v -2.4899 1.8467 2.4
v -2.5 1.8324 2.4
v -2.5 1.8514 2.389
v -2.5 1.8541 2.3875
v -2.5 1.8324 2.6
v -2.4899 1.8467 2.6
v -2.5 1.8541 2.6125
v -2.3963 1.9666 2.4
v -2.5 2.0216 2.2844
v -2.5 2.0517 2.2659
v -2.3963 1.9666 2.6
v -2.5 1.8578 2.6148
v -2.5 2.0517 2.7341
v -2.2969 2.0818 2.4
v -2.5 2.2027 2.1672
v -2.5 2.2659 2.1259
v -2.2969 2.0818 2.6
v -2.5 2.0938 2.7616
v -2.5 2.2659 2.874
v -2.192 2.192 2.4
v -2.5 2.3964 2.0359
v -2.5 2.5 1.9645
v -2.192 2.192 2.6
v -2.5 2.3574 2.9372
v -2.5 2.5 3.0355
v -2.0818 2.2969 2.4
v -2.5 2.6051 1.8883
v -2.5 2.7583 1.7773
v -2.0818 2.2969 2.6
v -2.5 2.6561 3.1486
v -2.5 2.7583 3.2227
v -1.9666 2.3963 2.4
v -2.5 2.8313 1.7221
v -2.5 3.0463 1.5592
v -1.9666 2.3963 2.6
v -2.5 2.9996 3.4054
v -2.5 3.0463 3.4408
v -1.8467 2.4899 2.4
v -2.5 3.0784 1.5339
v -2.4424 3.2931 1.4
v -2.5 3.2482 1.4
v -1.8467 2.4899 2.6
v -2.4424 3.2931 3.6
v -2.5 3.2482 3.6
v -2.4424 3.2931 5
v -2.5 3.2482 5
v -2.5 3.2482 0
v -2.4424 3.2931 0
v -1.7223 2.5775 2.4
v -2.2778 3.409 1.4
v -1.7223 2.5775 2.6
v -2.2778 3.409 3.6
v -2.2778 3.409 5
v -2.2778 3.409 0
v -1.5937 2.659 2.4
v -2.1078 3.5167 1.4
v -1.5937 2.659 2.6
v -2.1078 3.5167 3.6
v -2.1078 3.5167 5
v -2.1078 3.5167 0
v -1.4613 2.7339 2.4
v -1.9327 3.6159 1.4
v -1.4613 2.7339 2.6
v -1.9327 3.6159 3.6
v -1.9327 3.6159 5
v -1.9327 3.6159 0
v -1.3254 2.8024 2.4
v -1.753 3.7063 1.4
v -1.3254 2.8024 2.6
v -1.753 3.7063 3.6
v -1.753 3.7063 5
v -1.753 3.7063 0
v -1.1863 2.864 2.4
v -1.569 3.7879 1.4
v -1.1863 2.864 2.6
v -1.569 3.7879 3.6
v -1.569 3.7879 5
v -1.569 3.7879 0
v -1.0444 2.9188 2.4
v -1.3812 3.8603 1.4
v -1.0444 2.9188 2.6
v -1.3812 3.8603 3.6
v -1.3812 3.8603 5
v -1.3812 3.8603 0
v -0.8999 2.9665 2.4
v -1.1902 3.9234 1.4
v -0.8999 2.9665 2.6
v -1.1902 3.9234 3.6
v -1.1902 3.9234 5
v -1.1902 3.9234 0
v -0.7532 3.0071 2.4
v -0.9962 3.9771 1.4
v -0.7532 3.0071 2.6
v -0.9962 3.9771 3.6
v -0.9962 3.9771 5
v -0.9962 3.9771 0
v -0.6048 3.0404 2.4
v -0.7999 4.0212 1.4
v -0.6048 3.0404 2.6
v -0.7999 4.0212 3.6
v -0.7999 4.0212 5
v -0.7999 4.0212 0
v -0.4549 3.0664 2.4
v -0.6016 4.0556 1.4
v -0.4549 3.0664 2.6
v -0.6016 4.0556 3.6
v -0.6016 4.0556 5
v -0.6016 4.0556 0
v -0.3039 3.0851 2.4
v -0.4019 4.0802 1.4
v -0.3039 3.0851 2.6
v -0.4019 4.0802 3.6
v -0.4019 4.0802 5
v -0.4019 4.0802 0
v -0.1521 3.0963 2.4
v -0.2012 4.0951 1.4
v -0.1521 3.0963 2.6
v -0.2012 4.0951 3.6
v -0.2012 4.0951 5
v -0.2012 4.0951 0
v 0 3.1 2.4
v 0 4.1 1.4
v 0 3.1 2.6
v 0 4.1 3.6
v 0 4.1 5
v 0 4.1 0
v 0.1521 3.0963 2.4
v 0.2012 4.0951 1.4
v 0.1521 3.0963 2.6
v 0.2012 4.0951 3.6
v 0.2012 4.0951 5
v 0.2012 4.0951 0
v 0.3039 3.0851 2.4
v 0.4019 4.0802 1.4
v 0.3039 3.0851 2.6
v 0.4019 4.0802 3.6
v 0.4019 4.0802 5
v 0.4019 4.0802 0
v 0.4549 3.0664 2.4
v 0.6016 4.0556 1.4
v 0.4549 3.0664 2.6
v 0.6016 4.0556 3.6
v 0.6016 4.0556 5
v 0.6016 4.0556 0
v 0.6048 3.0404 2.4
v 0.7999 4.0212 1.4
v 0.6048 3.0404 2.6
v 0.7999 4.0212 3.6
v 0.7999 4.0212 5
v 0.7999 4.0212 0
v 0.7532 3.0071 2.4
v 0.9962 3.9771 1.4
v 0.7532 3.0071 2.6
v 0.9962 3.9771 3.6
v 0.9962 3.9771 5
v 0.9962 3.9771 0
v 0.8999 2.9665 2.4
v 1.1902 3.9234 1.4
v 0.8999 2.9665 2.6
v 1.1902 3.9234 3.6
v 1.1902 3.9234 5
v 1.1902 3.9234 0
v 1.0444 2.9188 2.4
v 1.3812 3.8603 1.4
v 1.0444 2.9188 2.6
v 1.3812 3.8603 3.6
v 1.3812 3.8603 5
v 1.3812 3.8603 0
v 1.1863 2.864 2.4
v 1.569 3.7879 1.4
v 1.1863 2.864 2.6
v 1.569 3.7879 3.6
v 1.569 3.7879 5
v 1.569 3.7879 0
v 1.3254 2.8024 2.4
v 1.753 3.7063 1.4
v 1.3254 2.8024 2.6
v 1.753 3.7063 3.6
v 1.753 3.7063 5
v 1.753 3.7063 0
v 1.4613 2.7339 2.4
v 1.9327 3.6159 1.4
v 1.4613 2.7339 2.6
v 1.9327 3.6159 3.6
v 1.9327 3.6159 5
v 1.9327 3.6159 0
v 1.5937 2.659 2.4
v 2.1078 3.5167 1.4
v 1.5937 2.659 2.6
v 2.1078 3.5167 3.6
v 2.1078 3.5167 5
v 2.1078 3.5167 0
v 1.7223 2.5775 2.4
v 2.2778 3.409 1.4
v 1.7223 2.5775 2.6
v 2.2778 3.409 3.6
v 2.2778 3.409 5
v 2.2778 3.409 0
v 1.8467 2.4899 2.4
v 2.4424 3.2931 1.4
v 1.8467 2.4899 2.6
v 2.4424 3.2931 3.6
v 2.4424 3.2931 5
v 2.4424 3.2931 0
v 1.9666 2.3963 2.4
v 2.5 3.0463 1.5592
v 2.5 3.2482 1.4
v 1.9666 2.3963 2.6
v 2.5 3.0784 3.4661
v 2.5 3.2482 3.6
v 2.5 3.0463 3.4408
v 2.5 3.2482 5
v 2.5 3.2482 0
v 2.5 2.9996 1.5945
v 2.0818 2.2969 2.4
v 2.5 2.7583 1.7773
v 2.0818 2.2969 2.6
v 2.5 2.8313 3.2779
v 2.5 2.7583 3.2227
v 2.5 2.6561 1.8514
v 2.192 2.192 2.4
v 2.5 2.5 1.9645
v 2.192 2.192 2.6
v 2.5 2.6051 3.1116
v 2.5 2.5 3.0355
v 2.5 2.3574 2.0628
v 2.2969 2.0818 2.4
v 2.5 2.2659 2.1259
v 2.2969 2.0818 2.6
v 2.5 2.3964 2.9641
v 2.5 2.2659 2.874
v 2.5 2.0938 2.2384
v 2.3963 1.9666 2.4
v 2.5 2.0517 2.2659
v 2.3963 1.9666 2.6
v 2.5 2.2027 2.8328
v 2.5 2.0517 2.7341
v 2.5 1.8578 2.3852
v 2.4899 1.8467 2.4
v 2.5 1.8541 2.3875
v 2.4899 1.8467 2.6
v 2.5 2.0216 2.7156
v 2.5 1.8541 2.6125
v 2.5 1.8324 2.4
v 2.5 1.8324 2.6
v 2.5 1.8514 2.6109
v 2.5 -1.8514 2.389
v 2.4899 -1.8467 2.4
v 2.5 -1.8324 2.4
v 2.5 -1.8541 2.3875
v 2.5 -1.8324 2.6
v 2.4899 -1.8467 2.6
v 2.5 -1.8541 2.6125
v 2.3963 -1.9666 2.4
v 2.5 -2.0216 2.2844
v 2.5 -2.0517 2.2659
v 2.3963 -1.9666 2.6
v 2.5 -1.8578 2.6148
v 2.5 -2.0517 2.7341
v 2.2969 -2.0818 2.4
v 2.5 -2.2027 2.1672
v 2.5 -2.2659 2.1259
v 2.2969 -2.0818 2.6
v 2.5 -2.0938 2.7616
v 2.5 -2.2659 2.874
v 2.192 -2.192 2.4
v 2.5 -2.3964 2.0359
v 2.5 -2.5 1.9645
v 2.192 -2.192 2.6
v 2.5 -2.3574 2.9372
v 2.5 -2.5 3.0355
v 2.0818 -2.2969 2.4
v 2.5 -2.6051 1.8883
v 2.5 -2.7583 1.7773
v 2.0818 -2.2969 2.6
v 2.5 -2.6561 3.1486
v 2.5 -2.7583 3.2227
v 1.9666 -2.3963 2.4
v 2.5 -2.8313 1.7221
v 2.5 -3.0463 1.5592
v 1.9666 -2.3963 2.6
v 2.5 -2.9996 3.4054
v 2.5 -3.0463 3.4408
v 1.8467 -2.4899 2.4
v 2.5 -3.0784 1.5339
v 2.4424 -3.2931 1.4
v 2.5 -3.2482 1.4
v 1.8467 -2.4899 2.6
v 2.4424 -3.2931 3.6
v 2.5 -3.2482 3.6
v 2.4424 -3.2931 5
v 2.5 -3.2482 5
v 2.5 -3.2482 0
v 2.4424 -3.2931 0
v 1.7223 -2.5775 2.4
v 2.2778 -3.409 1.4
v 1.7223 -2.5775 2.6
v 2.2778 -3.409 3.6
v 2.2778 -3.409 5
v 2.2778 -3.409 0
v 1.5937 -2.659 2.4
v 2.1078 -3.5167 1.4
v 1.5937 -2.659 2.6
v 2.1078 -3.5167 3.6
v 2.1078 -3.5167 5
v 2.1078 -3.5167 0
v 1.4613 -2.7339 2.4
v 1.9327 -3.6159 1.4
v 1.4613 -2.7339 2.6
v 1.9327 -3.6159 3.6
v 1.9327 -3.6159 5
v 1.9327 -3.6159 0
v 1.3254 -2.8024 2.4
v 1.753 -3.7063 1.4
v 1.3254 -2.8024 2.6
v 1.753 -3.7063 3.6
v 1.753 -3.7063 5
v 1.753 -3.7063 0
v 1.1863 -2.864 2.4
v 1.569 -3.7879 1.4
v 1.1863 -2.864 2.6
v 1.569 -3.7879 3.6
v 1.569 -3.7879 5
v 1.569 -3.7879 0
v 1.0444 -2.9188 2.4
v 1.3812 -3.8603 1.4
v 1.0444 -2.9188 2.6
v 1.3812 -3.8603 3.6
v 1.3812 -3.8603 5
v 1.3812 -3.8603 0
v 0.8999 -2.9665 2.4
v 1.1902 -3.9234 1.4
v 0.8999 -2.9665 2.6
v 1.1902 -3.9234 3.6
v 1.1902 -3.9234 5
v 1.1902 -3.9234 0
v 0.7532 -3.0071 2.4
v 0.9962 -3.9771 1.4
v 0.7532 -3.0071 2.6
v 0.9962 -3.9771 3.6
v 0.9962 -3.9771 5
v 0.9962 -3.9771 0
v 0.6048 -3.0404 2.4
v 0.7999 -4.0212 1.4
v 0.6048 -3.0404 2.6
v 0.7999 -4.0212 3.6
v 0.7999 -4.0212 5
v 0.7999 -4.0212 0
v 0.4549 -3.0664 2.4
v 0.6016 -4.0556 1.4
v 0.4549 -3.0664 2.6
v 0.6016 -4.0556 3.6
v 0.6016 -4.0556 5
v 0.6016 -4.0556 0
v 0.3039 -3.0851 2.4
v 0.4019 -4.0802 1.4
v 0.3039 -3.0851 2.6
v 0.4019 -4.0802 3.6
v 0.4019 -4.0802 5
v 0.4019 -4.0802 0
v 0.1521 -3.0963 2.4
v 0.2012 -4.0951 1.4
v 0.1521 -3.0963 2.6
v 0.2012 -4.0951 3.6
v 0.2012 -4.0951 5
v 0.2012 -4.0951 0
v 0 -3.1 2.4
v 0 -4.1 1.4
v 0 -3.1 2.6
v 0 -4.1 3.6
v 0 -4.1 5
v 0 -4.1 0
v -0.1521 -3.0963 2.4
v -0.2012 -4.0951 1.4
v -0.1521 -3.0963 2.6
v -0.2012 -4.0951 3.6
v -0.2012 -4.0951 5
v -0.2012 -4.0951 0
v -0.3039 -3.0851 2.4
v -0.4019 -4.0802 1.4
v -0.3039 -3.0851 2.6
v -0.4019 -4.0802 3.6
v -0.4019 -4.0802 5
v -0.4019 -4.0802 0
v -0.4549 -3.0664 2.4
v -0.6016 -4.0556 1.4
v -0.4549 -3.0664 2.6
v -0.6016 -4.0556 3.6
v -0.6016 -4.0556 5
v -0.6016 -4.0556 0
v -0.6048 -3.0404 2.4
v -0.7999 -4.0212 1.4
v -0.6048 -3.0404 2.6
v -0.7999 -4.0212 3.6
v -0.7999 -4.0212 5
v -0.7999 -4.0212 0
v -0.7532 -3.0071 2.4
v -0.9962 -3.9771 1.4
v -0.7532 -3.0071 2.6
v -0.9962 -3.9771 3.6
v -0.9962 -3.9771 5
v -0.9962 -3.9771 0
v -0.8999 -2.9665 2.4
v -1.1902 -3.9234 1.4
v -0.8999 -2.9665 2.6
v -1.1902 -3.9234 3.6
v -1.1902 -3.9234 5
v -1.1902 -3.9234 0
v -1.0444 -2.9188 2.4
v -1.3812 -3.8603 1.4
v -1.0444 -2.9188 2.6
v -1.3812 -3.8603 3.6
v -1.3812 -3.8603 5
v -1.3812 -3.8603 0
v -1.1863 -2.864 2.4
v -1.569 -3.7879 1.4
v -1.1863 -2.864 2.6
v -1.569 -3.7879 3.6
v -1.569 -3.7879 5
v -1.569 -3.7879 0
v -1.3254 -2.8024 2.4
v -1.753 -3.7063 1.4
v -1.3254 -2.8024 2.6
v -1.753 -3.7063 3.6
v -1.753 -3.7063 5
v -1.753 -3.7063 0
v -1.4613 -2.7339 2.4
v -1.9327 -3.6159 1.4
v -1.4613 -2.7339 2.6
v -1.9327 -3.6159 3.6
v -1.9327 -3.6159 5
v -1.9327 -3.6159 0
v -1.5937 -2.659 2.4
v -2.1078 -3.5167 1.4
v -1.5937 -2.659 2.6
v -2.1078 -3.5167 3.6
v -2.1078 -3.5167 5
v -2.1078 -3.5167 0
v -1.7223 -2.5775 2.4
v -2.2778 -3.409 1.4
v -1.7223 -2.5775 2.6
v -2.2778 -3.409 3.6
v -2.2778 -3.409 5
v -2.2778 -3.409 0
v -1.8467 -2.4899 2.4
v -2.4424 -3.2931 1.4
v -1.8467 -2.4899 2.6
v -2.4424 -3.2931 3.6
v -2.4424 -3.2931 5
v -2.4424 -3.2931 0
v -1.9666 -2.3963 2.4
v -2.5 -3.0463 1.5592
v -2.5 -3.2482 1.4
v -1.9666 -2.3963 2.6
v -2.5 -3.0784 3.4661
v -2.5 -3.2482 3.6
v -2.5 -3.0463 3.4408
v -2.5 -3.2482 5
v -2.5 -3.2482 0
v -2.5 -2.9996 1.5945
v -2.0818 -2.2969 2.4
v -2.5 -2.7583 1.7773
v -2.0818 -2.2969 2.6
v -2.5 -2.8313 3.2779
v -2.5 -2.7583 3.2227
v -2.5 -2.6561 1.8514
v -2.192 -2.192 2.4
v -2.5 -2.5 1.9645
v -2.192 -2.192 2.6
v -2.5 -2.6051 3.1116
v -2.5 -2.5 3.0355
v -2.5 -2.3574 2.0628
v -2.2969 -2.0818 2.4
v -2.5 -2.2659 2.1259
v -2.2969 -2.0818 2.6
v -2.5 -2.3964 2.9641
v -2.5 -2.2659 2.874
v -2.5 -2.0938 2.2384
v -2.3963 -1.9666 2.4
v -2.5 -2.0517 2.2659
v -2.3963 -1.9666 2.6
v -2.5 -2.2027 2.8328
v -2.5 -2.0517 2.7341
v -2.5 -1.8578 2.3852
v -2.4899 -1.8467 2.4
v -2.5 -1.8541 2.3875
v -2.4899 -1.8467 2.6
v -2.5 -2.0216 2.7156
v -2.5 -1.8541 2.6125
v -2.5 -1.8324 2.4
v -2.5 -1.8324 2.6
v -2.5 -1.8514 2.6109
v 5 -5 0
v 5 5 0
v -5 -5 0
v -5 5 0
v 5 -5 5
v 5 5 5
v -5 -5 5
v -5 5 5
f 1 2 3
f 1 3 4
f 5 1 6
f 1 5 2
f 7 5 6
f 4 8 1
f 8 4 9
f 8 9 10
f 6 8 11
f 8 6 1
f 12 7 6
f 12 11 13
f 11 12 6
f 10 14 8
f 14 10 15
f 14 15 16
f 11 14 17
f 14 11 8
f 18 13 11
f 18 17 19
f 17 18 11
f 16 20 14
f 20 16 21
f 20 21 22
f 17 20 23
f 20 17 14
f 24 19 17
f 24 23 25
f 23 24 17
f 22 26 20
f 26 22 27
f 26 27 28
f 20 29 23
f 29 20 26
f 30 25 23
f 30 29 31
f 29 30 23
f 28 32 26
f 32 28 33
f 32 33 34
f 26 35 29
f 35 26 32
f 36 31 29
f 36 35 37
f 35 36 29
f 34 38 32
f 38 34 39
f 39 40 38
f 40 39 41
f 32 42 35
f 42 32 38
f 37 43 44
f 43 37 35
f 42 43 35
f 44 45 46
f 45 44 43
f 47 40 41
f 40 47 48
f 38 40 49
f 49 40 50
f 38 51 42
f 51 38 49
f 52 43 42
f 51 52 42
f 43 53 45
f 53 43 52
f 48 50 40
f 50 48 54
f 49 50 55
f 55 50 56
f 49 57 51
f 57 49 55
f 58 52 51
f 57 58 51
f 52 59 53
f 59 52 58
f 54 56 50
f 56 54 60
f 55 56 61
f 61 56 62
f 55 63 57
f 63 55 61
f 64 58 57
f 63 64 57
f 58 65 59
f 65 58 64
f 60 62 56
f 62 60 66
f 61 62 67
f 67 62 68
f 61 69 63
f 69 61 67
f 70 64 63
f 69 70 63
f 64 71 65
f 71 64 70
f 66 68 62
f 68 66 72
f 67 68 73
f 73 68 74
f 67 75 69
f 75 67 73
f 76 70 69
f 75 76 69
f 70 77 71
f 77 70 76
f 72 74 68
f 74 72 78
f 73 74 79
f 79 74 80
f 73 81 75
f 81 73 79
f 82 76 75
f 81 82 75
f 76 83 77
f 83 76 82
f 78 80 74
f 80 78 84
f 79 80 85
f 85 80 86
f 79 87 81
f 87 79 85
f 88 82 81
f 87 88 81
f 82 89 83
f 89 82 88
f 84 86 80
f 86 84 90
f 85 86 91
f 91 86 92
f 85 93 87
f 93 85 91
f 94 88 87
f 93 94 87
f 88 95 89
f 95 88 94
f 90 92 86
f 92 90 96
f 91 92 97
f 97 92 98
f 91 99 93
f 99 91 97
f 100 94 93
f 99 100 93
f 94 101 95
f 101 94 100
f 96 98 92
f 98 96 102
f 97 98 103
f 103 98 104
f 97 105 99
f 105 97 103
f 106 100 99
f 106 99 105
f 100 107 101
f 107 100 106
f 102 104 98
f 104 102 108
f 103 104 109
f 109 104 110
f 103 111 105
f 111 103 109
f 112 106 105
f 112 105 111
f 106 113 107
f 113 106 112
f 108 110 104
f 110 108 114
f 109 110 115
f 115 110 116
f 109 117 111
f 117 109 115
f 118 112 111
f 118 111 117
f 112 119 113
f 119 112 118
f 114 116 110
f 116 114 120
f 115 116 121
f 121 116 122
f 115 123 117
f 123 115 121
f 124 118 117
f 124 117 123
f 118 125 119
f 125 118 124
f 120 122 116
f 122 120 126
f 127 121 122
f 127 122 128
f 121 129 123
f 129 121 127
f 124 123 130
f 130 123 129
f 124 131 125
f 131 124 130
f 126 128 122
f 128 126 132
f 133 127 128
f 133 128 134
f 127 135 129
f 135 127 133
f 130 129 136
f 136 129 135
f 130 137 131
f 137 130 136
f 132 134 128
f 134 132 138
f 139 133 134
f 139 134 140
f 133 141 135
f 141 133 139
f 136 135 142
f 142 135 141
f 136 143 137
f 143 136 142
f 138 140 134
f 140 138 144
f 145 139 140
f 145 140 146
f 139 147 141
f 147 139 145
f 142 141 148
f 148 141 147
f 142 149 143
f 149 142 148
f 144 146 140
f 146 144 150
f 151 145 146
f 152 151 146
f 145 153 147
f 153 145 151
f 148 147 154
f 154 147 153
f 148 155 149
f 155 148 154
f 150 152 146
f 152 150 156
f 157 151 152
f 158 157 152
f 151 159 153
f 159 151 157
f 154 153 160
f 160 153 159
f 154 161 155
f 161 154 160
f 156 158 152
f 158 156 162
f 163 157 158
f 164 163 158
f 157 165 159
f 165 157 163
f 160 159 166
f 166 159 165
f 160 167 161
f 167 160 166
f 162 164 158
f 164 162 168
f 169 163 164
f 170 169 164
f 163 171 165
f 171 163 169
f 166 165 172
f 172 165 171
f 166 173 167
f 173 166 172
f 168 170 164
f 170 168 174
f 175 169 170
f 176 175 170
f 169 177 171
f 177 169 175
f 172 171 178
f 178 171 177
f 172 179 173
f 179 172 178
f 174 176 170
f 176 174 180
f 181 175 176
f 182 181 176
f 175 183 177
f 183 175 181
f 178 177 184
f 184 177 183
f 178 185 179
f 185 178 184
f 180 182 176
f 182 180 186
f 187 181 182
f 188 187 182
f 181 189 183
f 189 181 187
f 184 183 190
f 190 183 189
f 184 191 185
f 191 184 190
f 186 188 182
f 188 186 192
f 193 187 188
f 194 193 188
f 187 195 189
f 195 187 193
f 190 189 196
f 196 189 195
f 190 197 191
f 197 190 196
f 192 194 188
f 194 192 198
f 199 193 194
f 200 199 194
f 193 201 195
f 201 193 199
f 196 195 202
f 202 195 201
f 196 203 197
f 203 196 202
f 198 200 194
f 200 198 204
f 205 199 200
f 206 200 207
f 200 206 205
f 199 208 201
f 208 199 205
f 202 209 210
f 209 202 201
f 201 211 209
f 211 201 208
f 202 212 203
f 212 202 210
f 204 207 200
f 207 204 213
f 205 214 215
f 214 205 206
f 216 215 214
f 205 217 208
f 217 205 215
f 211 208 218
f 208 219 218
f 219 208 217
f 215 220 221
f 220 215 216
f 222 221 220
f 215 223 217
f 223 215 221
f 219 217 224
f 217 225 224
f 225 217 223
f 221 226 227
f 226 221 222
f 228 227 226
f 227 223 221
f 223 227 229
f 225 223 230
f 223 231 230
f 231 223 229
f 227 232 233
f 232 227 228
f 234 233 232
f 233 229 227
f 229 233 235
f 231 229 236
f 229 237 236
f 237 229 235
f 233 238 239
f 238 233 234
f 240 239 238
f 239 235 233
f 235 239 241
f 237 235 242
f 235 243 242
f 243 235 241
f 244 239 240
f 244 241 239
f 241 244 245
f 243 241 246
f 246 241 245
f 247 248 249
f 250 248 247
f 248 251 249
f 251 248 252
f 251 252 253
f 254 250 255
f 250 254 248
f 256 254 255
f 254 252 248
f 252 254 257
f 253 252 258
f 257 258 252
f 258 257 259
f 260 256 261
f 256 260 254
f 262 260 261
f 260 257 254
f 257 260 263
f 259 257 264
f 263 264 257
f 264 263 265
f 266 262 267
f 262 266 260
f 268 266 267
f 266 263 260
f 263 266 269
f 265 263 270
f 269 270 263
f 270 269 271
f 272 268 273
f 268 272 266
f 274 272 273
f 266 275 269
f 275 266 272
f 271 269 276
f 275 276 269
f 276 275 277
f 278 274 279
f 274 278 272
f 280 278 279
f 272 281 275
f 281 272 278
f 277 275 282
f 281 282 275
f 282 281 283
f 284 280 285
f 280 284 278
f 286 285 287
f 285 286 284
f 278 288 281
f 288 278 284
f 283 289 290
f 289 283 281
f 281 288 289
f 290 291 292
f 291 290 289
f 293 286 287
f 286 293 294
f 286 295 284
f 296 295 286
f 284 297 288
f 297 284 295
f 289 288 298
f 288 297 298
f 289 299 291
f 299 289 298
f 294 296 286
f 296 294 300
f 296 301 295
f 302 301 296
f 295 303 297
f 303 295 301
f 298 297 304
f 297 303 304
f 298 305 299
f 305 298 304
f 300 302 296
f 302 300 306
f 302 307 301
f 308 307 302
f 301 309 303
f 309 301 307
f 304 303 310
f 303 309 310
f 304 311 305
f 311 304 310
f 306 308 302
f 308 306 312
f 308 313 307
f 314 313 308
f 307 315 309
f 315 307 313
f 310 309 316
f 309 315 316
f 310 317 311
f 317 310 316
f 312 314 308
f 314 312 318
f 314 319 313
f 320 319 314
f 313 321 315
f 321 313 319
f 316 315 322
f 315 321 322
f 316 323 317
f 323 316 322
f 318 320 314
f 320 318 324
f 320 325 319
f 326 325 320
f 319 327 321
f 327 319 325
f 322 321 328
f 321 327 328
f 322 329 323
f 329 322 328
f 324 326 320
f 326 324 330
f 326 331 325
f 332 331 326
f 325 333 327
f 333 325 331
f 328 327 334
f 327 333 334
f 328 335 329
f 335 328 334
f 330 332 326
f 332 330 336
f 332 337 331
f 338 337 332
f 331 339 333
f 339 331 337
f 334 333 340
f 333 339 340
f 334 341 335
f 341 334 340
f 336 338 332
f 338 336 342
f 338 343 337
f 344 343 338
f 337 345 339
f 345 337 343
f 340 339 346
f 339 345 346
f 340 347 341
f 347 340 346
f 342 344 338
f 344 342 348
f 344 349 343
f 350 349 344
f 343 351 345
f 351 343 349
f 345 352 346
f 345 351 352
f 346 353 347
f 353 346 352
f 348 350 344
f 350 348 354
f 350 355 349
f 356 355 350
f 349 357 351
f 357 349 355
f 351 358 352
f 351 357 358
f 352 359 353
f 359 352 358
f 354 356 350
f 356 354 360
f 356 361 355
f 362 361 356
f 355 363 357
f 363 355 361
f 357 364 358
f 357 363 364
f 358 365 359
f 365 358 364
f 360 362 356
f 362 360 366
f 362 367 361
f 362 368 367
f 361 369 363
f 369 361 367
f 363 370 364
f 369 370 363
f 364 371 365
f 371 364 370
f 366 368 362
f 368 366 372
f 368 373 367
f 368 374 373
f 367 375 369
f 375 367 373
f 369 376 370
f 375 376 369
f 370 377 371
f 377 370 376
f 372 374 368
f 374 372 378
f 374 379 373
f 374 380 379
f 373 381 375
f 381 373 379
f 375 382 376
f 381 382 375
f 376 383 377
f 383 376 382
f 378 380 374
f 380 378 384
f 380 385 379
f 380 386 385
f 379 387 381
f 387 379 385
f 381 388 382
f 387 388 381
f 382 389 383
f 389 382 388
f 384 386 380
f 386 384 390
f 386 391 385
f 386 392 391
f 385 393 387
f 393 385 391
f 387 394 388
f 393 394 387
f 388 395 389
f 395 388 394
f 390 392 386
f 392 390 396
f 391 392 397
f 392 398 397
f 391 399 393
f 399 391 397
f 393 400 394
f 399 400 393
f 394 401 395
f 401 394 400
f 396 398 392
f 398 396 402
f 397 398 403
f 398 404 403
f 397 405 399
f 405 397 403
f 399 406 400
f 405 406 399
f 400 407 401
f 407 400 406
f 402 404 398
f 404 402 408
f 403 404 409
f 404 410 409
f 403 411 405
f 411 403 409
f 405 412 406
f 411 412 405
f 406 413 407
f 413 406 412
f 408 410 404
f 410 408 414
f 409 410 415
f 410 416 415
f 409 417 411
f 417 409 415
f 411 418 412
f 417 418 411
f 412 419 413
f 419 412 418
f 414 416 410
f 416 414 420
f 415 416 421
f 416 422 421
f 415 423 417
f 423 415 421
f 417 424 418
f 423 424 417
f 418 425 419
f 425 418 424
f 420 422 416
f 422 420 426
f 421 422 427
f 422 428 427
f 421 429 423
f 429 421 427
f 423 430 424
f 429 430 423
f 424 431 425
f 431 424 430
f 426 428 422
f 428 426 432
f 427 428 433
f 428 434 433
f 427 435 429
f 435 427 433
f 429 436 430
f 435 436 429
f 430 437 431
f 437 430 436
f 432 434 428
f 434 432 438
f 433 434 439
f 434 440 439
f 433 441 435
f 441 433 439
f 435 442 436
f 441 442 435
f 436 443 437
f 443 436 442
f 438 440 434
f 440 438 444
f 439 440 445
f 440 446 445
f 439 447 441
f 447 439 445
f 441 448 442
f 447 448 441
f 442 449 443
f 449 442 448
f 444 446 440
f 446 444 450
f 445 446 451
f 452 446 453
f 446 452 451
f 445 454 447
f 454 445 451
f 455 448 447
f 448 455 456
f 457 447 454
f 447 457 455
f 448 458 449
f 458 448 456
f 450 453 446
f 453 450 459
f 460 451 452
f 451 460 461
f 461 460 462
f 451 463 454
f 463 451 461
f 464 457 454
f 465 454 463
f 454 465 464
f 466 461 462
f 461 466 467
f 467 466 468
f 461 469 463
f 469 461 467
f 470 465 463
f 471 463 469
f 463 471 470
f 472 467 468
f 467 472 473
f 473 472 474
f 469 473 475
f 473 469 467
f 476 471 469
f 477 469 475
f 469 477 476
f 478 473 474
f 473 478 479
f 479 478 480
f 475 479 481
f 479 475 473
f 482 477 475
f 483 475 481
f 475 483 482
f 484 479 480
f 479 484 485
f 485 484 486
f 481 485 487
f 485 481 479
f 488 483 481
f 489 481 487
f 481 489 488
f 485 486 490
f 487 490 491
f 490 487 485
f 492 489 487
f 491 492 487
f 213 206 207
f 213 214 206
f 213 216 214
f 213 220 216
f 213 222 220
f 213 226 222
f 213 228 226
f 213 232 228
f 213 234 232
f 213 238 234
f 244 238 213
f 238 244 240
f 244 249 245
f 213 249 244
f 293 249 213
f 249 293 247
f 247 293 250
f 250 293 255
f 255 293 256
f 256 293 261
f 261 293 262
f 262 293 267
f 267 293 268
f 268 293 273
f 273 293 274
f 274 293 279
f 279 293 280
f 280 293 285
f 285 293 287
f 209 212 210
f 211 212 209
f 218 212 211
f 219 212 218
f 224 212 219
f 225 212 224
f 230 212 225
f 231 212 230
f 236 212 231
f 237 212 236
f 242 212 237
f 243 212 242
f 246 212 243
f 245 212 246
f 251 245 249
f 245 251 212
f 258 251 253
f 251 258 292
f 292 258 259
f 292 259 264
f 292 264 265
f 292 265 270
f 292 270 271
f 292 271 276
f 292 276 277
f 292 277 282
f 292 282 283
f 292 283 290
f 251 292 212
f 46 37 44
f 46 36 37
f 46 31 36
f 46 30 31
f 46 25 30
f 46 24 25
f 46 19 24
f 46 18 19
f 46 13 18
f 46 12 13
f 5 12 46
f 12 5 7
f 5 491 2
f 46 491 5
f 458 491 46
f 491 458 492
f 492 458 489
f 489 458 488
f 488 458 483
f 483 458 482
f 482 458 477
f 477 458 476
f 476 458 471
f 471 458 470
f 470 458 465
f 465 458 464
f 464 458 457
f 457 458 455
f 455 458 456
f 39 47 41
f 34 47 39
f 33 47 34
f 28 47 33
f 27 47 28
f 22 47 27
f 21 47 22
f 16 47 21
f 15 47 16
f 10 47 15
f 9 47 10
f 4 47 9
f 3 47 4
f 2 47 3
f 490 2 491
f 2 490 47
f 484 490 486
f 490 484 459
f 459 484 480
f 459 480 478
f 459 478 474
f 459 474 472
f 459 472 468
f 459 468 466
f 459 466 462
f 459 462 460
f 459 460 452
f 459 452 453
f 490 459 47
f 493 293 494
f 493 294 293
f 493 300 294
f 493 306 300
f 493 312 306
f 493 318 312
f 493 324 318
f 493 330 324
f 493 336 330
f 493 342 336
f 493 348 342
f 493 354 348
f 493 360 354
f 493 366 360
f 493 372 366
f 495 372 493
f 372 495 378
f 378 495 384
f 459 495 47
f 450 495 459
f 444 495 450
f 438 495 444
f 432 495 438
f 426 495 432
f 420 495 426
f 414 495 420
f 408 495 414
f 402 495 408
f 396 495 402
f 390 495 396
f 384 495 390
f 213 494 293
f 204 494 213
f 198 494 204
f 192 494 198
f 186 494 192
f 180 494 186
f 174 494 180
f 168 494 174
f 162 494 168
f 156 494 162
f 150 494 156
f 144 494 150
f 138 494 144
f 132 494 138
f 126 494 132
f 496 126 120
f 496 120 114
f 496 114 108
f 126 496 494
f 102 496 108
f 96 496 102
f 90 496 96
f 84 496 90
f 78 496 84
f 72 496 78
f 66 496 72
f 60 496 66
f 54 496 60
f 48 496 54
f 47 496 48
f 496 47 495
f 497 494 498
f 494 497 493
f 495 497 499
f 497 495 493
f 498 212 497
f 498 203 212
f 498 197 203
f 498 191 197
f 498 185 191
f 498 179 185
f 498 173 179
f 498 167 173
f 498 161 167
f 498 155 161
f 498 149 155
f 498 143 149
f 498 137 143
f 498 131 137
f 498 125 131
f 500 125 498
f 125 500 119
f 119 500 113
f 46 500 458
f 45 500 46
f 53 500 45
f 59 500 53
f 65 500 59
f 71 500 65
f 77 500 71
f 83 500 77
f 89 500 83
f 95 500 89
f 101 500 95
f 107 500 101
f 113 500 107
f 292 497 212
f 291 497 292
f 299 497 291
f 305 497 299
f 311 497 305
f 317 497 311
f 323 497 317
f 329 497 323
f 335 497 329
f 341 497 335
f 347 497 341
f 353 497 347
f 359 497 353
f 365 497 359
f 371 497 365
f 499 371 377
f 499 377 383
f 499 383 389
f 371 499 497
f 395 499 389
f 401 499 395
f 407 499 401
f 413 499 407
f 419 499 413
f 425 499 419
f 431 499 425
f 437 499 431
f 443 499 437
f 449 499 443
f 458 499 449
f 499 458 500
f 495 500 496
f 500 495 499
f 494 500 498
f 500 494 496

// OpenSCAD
difference()
{
    linear_extrude(height = 5.0, twist = 0.0, scale = 1.0, slices = 1, center = false)
    {
        scale([10.0, 10.0])
        {
            M22();
        }
    }
    intersection()
    {
        rotate_extrude(angle = 360.0, $fn = 128)
        {
            M113();
        }
        translate([0.0, 0.0, -0.2])
        {
            linear_extrude(height = 10.4, twist = 0.0, scale = 1.0, slices = 1, center = false)
            {
                scale([5.0, 10.0])
                {
                    M22();
                }
            }
        }
    }
}

module M113()
{
    polygon
    (
        points =
        [
            [0.0, -0.2], 
            [4.1, -0.2], 
            [4.1, 1.4], 
            [3.1, 2.4], 
            [3.1, 2.6], 
            [4.1, 3.6], 
            [4.1, 5.2], 
            [0.0, 5.2]
        ],
        paths =
        [
            [0, 1, 2, 3, 4, 5, 6, 7]
        ]
    );
}

module M22()
{
    polygon
    (
        points =
        [
            [-0.5, -0.5], 
            [0.5, -0.5], 
            [0.5, 0.5], 
            [-0.5, 0.5]
        ],
        paths =
        [
            [0, 1, 2, 3]
        ]
    );
}
